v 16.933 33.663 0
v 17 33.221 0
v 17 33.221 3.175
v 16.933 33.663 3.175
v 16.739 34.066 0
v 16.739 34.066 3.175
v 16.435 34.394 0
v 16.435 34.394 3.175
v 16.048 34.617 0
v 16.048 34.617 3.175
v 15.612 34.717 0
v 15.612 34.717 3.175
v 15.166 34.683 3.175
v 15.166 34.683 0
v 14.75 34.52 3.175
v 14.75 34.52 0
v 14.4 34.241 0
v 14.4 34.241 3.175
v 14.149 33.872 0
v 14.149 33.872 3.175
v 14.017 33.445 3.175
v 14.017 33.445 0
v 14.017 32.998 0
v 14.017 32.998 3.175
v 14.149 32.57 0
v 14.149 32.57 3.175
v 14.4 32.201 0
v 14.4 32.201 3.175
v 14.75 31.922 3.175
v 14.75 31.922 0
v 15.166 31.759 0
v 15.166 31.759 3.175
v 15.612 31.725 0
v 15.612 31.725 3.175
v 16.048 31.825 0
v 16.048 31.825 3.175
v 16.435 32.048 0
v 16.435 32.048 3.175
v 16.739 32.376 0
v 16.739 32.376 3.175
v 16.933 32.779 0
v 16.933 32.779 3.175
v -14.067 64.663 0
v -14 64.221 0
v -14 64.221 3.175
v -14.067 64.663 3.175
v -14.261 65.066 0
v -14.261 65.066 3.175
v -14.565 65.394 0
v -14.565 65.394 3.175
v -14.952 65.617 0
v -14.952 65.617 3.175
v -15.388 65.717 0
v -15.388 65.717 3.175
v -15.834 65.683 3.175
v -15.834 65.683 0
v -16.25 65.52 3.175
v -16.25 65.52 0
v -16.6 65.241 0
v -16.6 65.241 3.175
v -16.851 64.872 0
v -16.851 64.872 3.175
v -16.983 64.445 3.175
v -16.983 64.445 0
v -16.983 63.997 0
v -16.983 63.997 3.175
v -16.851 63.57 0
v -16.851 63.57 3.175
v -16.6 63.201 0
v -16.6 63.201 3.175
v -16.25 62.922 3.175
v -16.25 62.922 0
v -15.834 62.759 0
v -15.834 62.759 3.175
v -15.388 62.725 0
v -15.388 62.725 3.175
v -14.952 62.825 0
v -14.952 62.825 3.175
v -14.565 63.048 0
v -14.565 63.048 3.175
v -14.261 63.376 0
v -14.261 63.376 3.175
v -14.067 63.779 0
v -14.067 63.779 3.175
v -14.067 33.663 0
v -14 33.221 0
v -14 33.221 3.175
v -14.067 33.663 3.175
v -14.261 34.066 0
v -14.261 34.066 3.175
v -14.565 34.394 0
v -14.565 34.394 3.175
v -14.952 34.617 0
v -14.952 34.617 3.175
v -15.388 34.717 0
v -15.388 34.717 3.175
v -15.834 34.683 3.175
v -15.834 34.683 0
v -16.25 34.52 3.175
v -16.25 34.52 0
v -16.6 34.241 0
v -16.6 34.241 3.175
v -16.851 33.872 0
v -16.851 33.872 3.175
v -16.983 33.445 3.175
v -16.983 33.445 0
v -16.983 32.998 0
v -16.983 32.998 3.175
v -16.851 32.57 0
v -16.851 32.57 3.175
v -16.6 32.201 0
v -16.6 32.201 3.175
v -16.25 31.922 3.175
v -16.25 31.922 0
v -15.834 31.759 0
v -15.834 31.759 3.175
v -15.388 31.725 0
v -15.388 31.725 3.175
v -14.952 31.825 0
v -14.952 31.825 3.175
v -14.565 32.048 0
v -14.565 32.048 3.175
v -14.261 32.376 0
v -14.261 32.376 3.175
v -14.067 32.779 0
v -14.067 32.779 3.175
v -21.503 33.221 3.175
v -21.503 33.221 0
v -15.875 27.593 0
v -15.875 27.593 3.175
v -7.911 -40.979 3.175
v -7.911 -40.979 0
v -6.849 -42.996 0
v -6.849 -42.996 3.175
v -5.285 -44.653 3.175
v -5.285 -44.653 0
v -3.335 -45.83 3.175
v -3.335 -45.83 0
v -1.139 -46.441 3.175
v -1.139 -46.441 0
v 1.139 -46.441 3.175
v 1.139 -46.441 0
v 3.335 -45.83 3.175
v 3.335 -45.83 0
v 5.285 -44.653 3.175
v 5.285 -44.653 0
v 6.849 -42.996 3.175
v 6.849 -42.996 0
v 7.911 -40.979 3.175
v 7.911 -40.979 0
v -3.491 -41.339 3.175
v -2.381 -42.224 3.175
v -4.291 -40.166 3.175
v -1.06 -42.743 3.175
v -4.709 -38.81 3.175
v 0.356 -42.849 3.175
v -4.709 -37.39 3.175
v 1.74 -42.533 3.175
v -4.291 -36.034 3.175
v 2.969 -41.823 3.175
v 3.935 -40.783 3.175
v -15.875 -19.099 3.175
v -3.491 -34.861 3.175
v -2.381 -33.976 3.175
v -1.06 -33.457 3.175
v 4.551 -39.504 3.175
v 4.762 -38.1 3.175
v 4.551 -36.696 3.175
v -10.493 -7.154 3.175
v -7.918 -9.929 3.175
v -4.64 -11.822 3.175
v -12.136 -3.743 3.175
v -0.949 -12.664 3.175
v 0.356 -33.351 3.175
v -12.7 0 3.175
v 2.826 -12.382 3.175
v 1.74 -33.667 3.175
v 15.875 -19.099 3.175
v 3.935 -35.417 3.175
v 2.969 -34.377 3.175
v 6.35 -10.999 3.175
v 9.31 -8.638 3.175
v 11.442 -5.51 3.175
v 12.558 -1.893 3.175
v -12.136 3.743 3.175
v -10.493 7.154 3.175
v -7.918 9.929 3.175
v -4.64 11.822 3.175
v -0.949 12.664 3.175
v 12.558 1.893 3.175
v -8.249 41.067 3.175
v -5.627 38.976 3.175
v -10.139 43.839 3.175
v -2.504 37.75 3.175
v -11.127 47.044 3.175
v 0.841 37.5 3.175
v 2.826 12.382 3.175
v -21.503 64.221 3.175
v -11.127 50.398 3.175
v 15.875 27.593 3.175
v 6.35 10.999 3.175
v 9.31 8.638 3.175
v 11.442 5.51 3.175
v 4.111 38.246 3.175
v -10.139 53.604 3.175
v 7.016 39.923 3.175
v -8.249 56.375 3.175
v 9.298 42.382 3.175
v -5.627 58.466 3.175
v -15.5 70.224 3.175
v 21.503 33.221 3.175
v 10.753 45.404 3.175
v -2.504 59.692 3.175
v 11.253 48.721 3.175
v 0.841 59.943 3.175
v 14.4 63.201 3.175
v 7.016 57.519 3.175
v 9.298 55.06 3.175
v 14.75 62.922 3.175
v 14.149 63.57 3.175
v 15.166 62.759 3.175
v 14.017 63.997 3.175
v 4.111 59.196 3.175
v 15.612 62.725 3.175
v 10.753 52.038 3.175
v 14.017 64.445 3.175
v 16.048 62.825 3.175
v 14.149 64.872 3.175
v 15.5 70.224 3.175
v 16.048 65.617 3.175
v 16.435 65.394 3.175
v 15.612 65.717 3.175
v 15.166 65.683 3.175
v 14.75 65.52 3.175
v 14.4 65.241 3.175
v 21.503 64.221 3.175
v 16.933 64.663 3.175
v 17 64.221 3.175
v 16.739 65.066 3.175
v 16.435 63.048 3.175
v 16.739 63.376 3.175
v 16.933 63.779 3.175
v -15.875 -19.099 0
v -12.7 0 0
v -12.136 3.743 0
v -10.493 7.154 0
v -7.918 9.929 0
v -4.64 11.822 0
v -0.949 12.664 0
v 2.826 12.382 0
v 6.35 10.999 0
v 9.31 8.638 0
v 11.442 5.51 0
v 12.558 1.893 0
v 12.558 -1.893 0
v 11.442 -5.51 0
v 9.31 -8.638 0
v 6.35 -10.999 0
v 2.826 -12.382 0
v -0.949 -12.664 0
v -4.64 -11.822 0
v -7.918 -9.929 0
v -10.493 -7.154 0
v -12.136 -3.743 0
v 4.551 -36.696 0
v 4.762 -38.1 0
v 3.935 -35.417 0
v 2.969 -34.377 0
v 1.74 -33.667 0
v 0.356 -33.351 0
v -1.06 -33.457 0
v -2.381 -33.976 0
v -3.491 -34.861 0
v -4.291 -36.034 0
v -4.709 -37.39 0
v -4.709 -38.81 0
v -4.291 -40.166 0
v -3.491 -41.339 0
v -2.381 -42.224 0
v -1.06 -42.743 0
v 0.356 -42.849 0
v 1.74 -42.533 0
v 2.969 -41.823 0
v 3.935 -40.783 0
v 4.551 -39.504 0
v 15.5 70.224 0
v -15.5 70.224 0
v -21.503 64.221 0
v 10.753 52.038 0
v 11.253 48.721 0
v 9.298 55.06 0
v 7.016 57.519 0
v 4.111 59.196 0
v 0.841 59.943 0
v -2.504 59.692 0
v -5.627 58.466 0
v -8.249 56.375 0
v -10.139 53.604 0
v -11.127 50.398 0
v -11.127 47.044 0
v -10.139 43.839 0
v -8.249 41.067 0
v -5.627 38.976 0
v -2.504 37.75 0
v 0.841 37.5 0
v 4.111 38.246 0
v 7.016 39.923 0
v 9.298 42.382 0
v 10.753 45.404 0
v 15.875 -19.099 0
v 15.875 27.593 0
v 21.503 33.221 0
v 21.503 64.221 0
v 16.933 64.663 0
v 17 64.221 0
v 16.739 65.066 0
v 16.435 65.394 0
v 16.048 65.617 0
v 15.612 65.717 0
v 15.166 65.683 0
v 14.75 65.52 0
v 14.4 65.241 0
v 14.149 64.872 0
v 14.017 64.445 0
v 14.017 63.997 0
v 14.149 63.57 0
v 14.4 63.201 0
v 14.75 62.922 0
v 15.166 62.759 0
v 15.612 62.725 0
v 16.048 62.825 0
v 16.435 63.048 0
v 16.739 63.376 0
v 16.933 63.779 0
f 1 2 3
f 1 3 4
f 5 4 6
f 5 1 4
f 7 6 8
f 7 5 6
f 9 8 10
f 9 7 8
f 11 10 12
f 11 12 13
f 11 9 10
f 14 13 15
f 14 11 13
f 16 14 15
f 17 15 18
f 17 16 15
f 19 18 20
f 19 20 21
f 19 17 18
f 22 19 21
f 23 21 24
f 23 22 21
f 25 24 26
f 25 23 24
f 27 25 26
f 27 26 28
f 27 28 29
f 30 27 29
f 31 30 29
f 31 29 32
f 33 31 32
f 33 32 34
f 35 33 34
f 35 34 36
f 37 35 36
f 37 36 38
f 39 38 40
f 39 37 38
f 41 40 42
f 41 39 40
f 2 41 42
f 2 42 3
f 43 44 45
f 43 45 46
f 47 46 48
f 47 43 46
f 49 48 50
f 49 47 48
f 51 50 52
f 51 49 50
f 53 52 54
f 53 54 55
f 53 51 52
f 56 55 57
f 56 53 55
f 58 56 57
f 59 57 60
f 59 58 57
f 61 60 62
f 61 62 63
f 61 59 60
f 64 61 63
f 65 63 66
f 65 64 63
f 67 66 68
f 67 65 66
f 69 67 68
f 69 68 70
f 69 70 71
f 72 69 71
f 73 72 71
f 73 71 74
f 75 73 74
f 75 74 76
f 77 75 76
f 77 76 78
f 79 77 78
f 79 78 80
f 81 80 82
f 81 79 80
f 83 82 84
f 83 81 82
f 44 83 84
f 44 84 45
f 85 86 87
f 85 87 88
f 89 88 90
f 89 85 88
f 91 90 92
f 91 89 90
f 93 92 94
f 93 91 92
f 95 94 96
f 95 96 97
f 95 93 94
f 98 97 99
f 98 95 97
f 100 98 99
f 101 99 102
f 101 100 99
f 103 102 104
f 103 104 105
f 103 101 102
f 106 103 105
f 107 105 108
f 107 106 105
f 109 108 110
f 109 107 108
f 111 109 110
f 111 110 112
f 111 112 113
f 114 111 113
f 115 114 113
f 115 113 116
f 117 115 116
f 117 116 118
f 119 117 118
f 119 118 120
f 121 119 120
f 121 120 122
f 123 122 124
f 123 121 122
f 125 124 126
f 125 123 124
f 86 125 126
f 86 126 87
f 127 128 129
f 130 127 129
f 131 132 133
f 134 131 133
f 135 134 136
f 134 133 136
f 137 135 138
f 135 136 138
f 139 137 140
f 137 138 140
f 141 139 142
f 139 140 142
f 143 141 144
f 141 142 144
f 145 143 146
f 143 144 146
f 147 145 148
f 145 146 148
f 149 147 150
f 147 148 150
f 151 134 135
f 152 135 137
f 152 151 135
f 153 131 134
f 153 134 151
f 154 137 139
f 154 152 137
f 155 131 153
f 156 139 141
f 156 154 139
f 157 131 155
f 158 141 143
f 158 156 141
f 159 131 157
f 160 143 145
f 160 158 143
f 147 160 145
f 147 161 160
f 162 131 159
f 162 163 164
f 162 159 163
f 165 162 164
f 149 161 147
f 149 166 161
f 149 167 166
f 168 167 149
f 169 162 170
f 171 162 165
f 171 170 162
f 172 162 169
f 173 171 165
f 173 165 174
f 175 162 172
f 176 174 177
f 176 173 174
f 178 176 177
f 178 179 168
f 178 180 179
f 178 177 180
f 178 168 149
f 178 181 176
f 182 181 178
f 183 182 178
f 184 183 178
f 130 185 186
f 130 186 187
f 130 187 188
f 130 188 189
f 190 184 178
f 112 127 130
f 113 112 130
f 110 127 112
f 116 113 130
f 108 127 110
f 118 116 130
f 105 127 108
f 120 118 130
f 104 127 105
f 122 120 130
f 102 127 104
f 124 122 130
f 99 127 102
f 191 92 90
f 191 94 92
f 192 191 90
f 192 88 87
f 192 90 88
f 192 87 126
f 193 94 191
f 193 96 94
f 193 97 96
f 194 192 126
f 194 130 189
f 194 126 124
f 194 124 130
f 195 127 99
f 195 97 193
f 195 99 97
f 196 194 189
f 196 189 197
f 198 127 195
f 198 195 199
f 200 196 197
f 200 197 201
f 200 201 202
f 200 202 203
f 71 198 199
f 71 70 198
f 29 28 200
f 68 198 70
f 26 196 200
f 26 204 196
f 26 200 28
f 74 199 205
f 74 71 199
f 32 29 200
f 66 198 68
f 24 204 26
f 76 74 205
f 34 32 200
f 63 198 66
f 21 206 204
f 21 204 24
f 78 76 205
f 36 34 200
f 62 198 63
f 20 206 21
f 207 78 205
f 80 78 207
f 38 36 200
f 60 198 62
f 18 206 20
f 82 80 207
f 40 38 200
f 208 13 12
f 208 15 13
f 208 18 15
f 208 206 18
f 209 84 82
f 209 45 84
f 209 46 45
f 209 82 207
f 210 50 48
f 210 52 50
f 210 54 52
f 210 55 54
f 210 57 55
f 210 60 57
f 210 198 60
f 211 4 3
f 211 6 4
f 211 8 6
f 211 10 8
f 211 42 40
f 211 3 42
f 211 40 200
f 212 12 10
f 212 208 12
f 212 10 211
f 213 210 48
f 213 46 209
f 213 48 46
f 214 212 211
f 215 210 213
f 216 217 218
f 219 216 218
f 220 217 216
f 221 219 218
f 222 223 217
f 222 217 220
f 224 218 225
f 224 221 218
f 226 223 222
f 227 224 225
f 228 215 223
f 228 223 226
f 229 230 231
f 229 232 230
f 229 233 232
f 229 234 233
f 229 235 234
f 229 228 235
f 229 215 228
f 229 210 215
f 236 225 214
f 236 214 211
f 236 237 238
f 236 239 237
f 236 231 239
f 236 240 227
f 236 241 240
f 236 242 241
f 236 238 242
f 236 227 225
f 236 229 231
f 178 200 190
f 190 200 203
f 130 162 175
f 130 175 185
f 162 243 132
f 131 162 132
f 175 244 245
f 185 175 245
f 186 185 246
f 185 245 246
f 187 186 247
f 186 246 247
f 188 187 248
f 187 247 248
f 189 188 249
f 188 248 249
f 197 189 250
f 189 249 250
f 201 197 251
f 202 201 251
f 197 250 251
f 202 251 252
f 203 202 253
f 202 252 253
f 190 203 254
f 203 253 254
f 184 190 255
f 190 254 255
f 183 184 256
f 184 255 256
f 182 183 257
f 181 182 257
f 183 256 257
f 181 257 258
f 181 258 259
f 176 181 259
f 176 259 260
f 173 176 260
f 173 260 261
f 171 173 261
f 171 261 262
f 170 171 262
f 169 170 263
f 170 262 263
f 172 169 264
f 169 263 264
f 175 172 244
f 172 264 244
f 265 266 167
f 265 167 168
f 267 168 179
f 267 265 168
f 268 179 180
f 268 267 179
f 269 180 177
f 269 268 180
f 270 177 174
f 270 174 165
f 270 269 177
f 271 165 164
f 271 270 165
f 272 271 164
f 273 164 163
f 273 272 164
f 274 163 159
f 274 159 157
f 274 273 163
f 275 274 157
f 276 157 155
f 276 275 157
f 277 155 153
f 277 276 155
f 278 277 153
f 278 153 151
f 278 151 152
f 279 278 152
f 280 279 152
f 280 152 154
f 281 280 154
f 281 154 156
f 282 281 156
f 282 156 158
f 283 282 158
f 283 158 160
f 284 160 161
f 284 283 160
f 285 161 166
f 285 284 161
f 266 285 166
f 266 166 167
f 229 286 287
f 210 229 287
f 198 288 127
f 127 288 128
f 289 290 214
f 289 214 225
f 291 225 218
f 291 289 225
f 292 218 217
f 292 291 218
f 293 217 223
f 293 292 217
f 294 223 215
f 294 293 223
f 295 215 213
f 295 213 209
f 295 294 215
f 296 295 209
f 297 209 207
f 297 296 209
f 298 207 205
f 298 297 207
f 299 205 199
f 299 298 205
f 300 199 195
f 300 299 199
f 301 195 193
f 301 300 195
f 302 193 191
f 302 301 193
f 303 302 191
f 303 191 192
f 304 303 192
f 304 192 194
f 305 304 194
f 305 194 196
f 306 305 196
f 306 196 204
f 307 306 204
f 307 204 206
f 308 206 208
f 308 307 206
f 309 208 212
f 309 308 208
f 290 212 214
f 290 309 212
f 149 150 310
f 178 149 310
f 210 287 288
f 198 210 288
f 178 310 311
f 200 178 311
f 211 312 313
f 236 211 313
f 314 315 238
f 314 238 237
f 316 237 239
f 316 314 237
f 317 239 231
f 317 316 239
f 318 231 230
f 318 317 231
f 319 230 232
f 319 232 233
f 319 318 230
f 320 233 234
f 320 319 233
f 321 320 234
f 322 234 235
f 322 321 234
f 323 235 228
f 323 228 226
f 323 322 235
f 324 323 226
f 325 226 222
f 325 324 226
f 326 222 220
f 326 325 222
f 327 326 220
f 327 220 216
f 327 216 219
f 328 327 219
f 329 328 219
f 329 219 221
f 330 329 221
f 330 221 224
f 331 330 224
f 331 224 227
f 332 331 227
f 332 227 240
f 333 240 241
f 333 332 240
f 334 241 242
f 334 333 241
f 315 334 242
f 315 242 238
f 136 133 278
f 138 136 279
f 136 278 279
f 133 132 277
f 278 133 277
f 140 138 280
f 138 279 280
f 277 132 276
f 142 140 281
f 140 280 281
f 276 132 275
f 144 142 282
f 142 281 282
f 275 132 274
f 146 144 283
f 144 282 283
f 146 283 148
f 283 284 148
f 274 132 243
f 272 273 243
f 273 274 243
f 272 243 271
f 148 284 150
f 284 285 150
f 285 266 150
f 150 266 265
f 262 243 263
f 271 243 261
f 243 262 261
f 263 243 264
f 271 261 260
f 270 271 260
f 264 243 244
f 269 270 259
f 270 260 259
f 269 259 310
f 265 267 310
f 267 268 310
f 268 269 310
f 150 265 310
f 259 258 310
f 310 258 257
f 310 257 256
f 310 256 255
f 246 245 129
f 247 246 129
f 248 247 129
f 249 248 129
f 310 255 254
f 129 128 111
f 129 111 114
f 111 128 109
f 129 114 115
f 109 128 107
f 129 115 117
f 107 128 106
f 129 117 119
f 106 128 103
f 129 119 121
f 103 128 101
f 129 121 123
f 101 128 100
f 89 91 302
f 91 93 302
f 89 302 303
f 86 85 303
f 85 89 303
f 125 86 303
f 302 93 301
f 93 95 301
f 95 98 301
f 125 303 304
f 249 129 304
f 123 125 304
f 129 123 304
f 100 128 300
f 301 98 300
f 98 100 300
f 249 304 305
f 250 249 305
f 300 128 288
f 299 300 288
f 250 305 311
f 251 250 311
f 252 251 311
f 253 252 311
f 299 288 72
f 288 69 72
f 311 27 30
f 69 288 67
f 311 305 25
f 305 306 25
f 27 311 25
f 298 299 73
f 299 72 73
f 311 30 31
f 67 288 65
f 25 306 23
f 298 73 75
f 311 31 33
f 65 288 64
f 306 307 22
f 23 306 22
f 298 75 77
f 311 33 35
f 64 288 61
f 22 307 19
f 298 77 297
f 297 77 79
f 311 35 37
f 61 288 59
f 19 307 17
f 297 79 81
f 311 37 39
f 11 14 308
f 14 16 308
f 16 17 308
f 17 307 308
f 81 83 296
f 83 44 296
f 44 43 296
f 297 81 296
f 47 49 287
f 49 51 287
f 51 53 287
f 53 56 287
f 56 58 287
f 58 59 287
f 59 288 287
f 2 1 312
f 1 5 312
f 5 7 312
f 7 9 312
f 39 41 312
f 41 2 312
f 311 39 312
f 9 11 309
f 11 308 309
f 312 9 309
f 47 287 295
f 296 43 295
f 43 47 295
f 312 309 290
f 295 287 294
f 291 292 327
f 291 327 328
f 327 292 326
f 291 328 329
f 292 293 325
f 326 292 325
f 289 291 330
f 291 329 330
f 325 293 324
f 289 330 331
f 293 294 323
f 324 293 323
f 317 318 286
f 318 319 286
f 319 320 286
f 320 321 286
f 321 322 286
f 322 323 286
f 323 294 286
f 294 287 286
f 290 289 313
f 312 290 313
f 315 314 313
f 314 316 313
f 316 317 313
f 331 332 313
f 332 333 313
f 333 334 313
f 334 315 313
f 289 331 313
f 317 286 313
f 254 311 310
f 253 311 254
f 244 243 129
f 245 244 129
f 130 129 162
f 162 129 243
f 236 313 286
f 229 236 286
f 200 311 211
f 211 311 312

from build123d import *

# Parameters (mm, degrees)
F0_R         = 4.7625
F0_R_2       = 1.5
F0_R_3       = 11.2530001
F1_DEPTH     = 3.175
F2_T1_DEPTH  = 34.0506804732
F2_T6_DEPTH  = 34.0506804732
F2_T11_DEPTH = 34.0506804732


# Not quite as in the source:
# - a fillet or chamfer that OpenCascade refuses, or shapes differently, is made with other operations: its cross-section is extruded or revolved along the edge and cut away or added


with BuildPart() as f1:
    # F0 (on Top) → F1 (new body)
    with BuildSketch(Plane.XY):
        with BuildLine():
            Line((15.875, 0), (12.7, 0))
            ThreePointArc((12.7, 0), (0, -12.7), (-12.7, 0))
            Line((-12.7, 0), (-15.875, 0))
            Line((-15.875, 0), (-15.875, -19.0989050379))
            Line((-15.875, -19.0989050379), (-7.9111435612, -40.9794207753))
            ThreePointArc((-7.9111435612, -40.9794207753), (0, -46.5188631327), (7.9111435612, -40.9794207753))
            Line((7.9111435612, -40.9794207753), (15.875, -19.0989050379))
            Line((15.875, -19.0989050379), (15.875, 0))
        make_face()
        with Locations((0, -38.1)):
            Circle(F0_R, mode=Mode.SUBTRACT)
        with BuildLine():
            ThreePointArc((-12.7, 0), (0, 12.7), (12.7, 0))
            Line((12.7, 0), (15.875, 0))
            Line((15.875, 0), (15.875, 27.2180678568))
            Line((15.875, 27.2180678568), (21.5029923, 27.2180678568))
            Line((21.5029923, 27.2180678568), (21.5029923, 70.2240524568))
            Line((21.5029923, 70.2240524568), (-21.5029923, 70.2240524568))
            Line((-21.5029923, 70.2240524568), (-21.5029923, 27.2180678568))
            Line((-21.5029923, 27.2180678568), (-15.875, 27.2180678568))
            Line((-15.875, 27.2180678568), (-15.875, 0))
            Line((-15.875, 0), (-12.7, 0))
        make_face()
        with Locations((-15.4999944, 33.2210657568)):
            Circle(F0_R_2, mode=Mode.SUBTRACT)
        with Locations((-15.4999944, 64.2210545568)):
            Circle(F0_R_2, mode=Mode.SUBTRACT)
        with Locations((15.4999944, 33.2210657568)):
            Circle(F0_R_2, mode=Mode.SUBTRACT)
        with Locations((0, 48.7210601568)):
            Circle(F0_R_3, mode=Mode.SUBTRACT)
        with Locations((15.4999944, 64.2210545568)):
            Circle(F0_R_2, mode=Mode.SUBTRACT)
    extrude(amount=F1_DEPTH)

    # F2: chamfer of 6.0030106 on 4 edges, made by hand

    # F2_s2 → F2_t1 (cut)
    with BuildSketch(Plane.XY.offset(-15.4378402366)):
        Polygon((21.5029923, 64.2210418568), (15.4999817, 70.2240524568), (21.5029923, 70.2240524568), align=None)
        Polygon((-15.4999817, 70.2240524568), (-21.5029923, 64.2210418568), (-21.5029923, 70.2240524568), align=None)
    extrude(amount=F2_T1_DEPTH, mode=Mode.SUBTRACT)


with BuildPart() as f2_tool4:
    # F2_s5 → F2_t6 (new body)
    with BuildSketch(Plane.XY.offset(-15.4378402366)):
        Polygon((15.4999817, 27.2180678568), (21.5029923, 33.2210784568), (21.5029923, 27.2180678568), align=None)
    extrude(amount=F2_T6_DEPTH)

    split(bisect_by=Plane.YZ.offset(15.875), keep=Keep.TOP)


with BuildPart() as f1_1:
    add(f1.part)

    # F2_t3: cut F2_tool4
    add(f2_tool4.part, mode=Mode.SUBTRACT)


with BuildPart() as f2_tool9:
    # F2_s10 → F2_t11 (new body)
    with BuildSketch(Plane.XY.offset(-15.4378402366)):
        Polygon((-21.5029923, 33.2210784568), (-15.4999817, 27.2180678568), (-21.5029923, 27.2180678568), align=None)
    extrude(amount=F2_T11_DEPTH)

    split(bisect_by=Plane.YZ.offset(-15.875), keep=Keep.BOTTOM)


with BuildPart() as f1_2:
    add(f1_1.part)

    # F2_t8: cut F2_tool9
    add(f2_tool9.part, mode=Mode.SUBTRACT)


solid = f1_2.part
